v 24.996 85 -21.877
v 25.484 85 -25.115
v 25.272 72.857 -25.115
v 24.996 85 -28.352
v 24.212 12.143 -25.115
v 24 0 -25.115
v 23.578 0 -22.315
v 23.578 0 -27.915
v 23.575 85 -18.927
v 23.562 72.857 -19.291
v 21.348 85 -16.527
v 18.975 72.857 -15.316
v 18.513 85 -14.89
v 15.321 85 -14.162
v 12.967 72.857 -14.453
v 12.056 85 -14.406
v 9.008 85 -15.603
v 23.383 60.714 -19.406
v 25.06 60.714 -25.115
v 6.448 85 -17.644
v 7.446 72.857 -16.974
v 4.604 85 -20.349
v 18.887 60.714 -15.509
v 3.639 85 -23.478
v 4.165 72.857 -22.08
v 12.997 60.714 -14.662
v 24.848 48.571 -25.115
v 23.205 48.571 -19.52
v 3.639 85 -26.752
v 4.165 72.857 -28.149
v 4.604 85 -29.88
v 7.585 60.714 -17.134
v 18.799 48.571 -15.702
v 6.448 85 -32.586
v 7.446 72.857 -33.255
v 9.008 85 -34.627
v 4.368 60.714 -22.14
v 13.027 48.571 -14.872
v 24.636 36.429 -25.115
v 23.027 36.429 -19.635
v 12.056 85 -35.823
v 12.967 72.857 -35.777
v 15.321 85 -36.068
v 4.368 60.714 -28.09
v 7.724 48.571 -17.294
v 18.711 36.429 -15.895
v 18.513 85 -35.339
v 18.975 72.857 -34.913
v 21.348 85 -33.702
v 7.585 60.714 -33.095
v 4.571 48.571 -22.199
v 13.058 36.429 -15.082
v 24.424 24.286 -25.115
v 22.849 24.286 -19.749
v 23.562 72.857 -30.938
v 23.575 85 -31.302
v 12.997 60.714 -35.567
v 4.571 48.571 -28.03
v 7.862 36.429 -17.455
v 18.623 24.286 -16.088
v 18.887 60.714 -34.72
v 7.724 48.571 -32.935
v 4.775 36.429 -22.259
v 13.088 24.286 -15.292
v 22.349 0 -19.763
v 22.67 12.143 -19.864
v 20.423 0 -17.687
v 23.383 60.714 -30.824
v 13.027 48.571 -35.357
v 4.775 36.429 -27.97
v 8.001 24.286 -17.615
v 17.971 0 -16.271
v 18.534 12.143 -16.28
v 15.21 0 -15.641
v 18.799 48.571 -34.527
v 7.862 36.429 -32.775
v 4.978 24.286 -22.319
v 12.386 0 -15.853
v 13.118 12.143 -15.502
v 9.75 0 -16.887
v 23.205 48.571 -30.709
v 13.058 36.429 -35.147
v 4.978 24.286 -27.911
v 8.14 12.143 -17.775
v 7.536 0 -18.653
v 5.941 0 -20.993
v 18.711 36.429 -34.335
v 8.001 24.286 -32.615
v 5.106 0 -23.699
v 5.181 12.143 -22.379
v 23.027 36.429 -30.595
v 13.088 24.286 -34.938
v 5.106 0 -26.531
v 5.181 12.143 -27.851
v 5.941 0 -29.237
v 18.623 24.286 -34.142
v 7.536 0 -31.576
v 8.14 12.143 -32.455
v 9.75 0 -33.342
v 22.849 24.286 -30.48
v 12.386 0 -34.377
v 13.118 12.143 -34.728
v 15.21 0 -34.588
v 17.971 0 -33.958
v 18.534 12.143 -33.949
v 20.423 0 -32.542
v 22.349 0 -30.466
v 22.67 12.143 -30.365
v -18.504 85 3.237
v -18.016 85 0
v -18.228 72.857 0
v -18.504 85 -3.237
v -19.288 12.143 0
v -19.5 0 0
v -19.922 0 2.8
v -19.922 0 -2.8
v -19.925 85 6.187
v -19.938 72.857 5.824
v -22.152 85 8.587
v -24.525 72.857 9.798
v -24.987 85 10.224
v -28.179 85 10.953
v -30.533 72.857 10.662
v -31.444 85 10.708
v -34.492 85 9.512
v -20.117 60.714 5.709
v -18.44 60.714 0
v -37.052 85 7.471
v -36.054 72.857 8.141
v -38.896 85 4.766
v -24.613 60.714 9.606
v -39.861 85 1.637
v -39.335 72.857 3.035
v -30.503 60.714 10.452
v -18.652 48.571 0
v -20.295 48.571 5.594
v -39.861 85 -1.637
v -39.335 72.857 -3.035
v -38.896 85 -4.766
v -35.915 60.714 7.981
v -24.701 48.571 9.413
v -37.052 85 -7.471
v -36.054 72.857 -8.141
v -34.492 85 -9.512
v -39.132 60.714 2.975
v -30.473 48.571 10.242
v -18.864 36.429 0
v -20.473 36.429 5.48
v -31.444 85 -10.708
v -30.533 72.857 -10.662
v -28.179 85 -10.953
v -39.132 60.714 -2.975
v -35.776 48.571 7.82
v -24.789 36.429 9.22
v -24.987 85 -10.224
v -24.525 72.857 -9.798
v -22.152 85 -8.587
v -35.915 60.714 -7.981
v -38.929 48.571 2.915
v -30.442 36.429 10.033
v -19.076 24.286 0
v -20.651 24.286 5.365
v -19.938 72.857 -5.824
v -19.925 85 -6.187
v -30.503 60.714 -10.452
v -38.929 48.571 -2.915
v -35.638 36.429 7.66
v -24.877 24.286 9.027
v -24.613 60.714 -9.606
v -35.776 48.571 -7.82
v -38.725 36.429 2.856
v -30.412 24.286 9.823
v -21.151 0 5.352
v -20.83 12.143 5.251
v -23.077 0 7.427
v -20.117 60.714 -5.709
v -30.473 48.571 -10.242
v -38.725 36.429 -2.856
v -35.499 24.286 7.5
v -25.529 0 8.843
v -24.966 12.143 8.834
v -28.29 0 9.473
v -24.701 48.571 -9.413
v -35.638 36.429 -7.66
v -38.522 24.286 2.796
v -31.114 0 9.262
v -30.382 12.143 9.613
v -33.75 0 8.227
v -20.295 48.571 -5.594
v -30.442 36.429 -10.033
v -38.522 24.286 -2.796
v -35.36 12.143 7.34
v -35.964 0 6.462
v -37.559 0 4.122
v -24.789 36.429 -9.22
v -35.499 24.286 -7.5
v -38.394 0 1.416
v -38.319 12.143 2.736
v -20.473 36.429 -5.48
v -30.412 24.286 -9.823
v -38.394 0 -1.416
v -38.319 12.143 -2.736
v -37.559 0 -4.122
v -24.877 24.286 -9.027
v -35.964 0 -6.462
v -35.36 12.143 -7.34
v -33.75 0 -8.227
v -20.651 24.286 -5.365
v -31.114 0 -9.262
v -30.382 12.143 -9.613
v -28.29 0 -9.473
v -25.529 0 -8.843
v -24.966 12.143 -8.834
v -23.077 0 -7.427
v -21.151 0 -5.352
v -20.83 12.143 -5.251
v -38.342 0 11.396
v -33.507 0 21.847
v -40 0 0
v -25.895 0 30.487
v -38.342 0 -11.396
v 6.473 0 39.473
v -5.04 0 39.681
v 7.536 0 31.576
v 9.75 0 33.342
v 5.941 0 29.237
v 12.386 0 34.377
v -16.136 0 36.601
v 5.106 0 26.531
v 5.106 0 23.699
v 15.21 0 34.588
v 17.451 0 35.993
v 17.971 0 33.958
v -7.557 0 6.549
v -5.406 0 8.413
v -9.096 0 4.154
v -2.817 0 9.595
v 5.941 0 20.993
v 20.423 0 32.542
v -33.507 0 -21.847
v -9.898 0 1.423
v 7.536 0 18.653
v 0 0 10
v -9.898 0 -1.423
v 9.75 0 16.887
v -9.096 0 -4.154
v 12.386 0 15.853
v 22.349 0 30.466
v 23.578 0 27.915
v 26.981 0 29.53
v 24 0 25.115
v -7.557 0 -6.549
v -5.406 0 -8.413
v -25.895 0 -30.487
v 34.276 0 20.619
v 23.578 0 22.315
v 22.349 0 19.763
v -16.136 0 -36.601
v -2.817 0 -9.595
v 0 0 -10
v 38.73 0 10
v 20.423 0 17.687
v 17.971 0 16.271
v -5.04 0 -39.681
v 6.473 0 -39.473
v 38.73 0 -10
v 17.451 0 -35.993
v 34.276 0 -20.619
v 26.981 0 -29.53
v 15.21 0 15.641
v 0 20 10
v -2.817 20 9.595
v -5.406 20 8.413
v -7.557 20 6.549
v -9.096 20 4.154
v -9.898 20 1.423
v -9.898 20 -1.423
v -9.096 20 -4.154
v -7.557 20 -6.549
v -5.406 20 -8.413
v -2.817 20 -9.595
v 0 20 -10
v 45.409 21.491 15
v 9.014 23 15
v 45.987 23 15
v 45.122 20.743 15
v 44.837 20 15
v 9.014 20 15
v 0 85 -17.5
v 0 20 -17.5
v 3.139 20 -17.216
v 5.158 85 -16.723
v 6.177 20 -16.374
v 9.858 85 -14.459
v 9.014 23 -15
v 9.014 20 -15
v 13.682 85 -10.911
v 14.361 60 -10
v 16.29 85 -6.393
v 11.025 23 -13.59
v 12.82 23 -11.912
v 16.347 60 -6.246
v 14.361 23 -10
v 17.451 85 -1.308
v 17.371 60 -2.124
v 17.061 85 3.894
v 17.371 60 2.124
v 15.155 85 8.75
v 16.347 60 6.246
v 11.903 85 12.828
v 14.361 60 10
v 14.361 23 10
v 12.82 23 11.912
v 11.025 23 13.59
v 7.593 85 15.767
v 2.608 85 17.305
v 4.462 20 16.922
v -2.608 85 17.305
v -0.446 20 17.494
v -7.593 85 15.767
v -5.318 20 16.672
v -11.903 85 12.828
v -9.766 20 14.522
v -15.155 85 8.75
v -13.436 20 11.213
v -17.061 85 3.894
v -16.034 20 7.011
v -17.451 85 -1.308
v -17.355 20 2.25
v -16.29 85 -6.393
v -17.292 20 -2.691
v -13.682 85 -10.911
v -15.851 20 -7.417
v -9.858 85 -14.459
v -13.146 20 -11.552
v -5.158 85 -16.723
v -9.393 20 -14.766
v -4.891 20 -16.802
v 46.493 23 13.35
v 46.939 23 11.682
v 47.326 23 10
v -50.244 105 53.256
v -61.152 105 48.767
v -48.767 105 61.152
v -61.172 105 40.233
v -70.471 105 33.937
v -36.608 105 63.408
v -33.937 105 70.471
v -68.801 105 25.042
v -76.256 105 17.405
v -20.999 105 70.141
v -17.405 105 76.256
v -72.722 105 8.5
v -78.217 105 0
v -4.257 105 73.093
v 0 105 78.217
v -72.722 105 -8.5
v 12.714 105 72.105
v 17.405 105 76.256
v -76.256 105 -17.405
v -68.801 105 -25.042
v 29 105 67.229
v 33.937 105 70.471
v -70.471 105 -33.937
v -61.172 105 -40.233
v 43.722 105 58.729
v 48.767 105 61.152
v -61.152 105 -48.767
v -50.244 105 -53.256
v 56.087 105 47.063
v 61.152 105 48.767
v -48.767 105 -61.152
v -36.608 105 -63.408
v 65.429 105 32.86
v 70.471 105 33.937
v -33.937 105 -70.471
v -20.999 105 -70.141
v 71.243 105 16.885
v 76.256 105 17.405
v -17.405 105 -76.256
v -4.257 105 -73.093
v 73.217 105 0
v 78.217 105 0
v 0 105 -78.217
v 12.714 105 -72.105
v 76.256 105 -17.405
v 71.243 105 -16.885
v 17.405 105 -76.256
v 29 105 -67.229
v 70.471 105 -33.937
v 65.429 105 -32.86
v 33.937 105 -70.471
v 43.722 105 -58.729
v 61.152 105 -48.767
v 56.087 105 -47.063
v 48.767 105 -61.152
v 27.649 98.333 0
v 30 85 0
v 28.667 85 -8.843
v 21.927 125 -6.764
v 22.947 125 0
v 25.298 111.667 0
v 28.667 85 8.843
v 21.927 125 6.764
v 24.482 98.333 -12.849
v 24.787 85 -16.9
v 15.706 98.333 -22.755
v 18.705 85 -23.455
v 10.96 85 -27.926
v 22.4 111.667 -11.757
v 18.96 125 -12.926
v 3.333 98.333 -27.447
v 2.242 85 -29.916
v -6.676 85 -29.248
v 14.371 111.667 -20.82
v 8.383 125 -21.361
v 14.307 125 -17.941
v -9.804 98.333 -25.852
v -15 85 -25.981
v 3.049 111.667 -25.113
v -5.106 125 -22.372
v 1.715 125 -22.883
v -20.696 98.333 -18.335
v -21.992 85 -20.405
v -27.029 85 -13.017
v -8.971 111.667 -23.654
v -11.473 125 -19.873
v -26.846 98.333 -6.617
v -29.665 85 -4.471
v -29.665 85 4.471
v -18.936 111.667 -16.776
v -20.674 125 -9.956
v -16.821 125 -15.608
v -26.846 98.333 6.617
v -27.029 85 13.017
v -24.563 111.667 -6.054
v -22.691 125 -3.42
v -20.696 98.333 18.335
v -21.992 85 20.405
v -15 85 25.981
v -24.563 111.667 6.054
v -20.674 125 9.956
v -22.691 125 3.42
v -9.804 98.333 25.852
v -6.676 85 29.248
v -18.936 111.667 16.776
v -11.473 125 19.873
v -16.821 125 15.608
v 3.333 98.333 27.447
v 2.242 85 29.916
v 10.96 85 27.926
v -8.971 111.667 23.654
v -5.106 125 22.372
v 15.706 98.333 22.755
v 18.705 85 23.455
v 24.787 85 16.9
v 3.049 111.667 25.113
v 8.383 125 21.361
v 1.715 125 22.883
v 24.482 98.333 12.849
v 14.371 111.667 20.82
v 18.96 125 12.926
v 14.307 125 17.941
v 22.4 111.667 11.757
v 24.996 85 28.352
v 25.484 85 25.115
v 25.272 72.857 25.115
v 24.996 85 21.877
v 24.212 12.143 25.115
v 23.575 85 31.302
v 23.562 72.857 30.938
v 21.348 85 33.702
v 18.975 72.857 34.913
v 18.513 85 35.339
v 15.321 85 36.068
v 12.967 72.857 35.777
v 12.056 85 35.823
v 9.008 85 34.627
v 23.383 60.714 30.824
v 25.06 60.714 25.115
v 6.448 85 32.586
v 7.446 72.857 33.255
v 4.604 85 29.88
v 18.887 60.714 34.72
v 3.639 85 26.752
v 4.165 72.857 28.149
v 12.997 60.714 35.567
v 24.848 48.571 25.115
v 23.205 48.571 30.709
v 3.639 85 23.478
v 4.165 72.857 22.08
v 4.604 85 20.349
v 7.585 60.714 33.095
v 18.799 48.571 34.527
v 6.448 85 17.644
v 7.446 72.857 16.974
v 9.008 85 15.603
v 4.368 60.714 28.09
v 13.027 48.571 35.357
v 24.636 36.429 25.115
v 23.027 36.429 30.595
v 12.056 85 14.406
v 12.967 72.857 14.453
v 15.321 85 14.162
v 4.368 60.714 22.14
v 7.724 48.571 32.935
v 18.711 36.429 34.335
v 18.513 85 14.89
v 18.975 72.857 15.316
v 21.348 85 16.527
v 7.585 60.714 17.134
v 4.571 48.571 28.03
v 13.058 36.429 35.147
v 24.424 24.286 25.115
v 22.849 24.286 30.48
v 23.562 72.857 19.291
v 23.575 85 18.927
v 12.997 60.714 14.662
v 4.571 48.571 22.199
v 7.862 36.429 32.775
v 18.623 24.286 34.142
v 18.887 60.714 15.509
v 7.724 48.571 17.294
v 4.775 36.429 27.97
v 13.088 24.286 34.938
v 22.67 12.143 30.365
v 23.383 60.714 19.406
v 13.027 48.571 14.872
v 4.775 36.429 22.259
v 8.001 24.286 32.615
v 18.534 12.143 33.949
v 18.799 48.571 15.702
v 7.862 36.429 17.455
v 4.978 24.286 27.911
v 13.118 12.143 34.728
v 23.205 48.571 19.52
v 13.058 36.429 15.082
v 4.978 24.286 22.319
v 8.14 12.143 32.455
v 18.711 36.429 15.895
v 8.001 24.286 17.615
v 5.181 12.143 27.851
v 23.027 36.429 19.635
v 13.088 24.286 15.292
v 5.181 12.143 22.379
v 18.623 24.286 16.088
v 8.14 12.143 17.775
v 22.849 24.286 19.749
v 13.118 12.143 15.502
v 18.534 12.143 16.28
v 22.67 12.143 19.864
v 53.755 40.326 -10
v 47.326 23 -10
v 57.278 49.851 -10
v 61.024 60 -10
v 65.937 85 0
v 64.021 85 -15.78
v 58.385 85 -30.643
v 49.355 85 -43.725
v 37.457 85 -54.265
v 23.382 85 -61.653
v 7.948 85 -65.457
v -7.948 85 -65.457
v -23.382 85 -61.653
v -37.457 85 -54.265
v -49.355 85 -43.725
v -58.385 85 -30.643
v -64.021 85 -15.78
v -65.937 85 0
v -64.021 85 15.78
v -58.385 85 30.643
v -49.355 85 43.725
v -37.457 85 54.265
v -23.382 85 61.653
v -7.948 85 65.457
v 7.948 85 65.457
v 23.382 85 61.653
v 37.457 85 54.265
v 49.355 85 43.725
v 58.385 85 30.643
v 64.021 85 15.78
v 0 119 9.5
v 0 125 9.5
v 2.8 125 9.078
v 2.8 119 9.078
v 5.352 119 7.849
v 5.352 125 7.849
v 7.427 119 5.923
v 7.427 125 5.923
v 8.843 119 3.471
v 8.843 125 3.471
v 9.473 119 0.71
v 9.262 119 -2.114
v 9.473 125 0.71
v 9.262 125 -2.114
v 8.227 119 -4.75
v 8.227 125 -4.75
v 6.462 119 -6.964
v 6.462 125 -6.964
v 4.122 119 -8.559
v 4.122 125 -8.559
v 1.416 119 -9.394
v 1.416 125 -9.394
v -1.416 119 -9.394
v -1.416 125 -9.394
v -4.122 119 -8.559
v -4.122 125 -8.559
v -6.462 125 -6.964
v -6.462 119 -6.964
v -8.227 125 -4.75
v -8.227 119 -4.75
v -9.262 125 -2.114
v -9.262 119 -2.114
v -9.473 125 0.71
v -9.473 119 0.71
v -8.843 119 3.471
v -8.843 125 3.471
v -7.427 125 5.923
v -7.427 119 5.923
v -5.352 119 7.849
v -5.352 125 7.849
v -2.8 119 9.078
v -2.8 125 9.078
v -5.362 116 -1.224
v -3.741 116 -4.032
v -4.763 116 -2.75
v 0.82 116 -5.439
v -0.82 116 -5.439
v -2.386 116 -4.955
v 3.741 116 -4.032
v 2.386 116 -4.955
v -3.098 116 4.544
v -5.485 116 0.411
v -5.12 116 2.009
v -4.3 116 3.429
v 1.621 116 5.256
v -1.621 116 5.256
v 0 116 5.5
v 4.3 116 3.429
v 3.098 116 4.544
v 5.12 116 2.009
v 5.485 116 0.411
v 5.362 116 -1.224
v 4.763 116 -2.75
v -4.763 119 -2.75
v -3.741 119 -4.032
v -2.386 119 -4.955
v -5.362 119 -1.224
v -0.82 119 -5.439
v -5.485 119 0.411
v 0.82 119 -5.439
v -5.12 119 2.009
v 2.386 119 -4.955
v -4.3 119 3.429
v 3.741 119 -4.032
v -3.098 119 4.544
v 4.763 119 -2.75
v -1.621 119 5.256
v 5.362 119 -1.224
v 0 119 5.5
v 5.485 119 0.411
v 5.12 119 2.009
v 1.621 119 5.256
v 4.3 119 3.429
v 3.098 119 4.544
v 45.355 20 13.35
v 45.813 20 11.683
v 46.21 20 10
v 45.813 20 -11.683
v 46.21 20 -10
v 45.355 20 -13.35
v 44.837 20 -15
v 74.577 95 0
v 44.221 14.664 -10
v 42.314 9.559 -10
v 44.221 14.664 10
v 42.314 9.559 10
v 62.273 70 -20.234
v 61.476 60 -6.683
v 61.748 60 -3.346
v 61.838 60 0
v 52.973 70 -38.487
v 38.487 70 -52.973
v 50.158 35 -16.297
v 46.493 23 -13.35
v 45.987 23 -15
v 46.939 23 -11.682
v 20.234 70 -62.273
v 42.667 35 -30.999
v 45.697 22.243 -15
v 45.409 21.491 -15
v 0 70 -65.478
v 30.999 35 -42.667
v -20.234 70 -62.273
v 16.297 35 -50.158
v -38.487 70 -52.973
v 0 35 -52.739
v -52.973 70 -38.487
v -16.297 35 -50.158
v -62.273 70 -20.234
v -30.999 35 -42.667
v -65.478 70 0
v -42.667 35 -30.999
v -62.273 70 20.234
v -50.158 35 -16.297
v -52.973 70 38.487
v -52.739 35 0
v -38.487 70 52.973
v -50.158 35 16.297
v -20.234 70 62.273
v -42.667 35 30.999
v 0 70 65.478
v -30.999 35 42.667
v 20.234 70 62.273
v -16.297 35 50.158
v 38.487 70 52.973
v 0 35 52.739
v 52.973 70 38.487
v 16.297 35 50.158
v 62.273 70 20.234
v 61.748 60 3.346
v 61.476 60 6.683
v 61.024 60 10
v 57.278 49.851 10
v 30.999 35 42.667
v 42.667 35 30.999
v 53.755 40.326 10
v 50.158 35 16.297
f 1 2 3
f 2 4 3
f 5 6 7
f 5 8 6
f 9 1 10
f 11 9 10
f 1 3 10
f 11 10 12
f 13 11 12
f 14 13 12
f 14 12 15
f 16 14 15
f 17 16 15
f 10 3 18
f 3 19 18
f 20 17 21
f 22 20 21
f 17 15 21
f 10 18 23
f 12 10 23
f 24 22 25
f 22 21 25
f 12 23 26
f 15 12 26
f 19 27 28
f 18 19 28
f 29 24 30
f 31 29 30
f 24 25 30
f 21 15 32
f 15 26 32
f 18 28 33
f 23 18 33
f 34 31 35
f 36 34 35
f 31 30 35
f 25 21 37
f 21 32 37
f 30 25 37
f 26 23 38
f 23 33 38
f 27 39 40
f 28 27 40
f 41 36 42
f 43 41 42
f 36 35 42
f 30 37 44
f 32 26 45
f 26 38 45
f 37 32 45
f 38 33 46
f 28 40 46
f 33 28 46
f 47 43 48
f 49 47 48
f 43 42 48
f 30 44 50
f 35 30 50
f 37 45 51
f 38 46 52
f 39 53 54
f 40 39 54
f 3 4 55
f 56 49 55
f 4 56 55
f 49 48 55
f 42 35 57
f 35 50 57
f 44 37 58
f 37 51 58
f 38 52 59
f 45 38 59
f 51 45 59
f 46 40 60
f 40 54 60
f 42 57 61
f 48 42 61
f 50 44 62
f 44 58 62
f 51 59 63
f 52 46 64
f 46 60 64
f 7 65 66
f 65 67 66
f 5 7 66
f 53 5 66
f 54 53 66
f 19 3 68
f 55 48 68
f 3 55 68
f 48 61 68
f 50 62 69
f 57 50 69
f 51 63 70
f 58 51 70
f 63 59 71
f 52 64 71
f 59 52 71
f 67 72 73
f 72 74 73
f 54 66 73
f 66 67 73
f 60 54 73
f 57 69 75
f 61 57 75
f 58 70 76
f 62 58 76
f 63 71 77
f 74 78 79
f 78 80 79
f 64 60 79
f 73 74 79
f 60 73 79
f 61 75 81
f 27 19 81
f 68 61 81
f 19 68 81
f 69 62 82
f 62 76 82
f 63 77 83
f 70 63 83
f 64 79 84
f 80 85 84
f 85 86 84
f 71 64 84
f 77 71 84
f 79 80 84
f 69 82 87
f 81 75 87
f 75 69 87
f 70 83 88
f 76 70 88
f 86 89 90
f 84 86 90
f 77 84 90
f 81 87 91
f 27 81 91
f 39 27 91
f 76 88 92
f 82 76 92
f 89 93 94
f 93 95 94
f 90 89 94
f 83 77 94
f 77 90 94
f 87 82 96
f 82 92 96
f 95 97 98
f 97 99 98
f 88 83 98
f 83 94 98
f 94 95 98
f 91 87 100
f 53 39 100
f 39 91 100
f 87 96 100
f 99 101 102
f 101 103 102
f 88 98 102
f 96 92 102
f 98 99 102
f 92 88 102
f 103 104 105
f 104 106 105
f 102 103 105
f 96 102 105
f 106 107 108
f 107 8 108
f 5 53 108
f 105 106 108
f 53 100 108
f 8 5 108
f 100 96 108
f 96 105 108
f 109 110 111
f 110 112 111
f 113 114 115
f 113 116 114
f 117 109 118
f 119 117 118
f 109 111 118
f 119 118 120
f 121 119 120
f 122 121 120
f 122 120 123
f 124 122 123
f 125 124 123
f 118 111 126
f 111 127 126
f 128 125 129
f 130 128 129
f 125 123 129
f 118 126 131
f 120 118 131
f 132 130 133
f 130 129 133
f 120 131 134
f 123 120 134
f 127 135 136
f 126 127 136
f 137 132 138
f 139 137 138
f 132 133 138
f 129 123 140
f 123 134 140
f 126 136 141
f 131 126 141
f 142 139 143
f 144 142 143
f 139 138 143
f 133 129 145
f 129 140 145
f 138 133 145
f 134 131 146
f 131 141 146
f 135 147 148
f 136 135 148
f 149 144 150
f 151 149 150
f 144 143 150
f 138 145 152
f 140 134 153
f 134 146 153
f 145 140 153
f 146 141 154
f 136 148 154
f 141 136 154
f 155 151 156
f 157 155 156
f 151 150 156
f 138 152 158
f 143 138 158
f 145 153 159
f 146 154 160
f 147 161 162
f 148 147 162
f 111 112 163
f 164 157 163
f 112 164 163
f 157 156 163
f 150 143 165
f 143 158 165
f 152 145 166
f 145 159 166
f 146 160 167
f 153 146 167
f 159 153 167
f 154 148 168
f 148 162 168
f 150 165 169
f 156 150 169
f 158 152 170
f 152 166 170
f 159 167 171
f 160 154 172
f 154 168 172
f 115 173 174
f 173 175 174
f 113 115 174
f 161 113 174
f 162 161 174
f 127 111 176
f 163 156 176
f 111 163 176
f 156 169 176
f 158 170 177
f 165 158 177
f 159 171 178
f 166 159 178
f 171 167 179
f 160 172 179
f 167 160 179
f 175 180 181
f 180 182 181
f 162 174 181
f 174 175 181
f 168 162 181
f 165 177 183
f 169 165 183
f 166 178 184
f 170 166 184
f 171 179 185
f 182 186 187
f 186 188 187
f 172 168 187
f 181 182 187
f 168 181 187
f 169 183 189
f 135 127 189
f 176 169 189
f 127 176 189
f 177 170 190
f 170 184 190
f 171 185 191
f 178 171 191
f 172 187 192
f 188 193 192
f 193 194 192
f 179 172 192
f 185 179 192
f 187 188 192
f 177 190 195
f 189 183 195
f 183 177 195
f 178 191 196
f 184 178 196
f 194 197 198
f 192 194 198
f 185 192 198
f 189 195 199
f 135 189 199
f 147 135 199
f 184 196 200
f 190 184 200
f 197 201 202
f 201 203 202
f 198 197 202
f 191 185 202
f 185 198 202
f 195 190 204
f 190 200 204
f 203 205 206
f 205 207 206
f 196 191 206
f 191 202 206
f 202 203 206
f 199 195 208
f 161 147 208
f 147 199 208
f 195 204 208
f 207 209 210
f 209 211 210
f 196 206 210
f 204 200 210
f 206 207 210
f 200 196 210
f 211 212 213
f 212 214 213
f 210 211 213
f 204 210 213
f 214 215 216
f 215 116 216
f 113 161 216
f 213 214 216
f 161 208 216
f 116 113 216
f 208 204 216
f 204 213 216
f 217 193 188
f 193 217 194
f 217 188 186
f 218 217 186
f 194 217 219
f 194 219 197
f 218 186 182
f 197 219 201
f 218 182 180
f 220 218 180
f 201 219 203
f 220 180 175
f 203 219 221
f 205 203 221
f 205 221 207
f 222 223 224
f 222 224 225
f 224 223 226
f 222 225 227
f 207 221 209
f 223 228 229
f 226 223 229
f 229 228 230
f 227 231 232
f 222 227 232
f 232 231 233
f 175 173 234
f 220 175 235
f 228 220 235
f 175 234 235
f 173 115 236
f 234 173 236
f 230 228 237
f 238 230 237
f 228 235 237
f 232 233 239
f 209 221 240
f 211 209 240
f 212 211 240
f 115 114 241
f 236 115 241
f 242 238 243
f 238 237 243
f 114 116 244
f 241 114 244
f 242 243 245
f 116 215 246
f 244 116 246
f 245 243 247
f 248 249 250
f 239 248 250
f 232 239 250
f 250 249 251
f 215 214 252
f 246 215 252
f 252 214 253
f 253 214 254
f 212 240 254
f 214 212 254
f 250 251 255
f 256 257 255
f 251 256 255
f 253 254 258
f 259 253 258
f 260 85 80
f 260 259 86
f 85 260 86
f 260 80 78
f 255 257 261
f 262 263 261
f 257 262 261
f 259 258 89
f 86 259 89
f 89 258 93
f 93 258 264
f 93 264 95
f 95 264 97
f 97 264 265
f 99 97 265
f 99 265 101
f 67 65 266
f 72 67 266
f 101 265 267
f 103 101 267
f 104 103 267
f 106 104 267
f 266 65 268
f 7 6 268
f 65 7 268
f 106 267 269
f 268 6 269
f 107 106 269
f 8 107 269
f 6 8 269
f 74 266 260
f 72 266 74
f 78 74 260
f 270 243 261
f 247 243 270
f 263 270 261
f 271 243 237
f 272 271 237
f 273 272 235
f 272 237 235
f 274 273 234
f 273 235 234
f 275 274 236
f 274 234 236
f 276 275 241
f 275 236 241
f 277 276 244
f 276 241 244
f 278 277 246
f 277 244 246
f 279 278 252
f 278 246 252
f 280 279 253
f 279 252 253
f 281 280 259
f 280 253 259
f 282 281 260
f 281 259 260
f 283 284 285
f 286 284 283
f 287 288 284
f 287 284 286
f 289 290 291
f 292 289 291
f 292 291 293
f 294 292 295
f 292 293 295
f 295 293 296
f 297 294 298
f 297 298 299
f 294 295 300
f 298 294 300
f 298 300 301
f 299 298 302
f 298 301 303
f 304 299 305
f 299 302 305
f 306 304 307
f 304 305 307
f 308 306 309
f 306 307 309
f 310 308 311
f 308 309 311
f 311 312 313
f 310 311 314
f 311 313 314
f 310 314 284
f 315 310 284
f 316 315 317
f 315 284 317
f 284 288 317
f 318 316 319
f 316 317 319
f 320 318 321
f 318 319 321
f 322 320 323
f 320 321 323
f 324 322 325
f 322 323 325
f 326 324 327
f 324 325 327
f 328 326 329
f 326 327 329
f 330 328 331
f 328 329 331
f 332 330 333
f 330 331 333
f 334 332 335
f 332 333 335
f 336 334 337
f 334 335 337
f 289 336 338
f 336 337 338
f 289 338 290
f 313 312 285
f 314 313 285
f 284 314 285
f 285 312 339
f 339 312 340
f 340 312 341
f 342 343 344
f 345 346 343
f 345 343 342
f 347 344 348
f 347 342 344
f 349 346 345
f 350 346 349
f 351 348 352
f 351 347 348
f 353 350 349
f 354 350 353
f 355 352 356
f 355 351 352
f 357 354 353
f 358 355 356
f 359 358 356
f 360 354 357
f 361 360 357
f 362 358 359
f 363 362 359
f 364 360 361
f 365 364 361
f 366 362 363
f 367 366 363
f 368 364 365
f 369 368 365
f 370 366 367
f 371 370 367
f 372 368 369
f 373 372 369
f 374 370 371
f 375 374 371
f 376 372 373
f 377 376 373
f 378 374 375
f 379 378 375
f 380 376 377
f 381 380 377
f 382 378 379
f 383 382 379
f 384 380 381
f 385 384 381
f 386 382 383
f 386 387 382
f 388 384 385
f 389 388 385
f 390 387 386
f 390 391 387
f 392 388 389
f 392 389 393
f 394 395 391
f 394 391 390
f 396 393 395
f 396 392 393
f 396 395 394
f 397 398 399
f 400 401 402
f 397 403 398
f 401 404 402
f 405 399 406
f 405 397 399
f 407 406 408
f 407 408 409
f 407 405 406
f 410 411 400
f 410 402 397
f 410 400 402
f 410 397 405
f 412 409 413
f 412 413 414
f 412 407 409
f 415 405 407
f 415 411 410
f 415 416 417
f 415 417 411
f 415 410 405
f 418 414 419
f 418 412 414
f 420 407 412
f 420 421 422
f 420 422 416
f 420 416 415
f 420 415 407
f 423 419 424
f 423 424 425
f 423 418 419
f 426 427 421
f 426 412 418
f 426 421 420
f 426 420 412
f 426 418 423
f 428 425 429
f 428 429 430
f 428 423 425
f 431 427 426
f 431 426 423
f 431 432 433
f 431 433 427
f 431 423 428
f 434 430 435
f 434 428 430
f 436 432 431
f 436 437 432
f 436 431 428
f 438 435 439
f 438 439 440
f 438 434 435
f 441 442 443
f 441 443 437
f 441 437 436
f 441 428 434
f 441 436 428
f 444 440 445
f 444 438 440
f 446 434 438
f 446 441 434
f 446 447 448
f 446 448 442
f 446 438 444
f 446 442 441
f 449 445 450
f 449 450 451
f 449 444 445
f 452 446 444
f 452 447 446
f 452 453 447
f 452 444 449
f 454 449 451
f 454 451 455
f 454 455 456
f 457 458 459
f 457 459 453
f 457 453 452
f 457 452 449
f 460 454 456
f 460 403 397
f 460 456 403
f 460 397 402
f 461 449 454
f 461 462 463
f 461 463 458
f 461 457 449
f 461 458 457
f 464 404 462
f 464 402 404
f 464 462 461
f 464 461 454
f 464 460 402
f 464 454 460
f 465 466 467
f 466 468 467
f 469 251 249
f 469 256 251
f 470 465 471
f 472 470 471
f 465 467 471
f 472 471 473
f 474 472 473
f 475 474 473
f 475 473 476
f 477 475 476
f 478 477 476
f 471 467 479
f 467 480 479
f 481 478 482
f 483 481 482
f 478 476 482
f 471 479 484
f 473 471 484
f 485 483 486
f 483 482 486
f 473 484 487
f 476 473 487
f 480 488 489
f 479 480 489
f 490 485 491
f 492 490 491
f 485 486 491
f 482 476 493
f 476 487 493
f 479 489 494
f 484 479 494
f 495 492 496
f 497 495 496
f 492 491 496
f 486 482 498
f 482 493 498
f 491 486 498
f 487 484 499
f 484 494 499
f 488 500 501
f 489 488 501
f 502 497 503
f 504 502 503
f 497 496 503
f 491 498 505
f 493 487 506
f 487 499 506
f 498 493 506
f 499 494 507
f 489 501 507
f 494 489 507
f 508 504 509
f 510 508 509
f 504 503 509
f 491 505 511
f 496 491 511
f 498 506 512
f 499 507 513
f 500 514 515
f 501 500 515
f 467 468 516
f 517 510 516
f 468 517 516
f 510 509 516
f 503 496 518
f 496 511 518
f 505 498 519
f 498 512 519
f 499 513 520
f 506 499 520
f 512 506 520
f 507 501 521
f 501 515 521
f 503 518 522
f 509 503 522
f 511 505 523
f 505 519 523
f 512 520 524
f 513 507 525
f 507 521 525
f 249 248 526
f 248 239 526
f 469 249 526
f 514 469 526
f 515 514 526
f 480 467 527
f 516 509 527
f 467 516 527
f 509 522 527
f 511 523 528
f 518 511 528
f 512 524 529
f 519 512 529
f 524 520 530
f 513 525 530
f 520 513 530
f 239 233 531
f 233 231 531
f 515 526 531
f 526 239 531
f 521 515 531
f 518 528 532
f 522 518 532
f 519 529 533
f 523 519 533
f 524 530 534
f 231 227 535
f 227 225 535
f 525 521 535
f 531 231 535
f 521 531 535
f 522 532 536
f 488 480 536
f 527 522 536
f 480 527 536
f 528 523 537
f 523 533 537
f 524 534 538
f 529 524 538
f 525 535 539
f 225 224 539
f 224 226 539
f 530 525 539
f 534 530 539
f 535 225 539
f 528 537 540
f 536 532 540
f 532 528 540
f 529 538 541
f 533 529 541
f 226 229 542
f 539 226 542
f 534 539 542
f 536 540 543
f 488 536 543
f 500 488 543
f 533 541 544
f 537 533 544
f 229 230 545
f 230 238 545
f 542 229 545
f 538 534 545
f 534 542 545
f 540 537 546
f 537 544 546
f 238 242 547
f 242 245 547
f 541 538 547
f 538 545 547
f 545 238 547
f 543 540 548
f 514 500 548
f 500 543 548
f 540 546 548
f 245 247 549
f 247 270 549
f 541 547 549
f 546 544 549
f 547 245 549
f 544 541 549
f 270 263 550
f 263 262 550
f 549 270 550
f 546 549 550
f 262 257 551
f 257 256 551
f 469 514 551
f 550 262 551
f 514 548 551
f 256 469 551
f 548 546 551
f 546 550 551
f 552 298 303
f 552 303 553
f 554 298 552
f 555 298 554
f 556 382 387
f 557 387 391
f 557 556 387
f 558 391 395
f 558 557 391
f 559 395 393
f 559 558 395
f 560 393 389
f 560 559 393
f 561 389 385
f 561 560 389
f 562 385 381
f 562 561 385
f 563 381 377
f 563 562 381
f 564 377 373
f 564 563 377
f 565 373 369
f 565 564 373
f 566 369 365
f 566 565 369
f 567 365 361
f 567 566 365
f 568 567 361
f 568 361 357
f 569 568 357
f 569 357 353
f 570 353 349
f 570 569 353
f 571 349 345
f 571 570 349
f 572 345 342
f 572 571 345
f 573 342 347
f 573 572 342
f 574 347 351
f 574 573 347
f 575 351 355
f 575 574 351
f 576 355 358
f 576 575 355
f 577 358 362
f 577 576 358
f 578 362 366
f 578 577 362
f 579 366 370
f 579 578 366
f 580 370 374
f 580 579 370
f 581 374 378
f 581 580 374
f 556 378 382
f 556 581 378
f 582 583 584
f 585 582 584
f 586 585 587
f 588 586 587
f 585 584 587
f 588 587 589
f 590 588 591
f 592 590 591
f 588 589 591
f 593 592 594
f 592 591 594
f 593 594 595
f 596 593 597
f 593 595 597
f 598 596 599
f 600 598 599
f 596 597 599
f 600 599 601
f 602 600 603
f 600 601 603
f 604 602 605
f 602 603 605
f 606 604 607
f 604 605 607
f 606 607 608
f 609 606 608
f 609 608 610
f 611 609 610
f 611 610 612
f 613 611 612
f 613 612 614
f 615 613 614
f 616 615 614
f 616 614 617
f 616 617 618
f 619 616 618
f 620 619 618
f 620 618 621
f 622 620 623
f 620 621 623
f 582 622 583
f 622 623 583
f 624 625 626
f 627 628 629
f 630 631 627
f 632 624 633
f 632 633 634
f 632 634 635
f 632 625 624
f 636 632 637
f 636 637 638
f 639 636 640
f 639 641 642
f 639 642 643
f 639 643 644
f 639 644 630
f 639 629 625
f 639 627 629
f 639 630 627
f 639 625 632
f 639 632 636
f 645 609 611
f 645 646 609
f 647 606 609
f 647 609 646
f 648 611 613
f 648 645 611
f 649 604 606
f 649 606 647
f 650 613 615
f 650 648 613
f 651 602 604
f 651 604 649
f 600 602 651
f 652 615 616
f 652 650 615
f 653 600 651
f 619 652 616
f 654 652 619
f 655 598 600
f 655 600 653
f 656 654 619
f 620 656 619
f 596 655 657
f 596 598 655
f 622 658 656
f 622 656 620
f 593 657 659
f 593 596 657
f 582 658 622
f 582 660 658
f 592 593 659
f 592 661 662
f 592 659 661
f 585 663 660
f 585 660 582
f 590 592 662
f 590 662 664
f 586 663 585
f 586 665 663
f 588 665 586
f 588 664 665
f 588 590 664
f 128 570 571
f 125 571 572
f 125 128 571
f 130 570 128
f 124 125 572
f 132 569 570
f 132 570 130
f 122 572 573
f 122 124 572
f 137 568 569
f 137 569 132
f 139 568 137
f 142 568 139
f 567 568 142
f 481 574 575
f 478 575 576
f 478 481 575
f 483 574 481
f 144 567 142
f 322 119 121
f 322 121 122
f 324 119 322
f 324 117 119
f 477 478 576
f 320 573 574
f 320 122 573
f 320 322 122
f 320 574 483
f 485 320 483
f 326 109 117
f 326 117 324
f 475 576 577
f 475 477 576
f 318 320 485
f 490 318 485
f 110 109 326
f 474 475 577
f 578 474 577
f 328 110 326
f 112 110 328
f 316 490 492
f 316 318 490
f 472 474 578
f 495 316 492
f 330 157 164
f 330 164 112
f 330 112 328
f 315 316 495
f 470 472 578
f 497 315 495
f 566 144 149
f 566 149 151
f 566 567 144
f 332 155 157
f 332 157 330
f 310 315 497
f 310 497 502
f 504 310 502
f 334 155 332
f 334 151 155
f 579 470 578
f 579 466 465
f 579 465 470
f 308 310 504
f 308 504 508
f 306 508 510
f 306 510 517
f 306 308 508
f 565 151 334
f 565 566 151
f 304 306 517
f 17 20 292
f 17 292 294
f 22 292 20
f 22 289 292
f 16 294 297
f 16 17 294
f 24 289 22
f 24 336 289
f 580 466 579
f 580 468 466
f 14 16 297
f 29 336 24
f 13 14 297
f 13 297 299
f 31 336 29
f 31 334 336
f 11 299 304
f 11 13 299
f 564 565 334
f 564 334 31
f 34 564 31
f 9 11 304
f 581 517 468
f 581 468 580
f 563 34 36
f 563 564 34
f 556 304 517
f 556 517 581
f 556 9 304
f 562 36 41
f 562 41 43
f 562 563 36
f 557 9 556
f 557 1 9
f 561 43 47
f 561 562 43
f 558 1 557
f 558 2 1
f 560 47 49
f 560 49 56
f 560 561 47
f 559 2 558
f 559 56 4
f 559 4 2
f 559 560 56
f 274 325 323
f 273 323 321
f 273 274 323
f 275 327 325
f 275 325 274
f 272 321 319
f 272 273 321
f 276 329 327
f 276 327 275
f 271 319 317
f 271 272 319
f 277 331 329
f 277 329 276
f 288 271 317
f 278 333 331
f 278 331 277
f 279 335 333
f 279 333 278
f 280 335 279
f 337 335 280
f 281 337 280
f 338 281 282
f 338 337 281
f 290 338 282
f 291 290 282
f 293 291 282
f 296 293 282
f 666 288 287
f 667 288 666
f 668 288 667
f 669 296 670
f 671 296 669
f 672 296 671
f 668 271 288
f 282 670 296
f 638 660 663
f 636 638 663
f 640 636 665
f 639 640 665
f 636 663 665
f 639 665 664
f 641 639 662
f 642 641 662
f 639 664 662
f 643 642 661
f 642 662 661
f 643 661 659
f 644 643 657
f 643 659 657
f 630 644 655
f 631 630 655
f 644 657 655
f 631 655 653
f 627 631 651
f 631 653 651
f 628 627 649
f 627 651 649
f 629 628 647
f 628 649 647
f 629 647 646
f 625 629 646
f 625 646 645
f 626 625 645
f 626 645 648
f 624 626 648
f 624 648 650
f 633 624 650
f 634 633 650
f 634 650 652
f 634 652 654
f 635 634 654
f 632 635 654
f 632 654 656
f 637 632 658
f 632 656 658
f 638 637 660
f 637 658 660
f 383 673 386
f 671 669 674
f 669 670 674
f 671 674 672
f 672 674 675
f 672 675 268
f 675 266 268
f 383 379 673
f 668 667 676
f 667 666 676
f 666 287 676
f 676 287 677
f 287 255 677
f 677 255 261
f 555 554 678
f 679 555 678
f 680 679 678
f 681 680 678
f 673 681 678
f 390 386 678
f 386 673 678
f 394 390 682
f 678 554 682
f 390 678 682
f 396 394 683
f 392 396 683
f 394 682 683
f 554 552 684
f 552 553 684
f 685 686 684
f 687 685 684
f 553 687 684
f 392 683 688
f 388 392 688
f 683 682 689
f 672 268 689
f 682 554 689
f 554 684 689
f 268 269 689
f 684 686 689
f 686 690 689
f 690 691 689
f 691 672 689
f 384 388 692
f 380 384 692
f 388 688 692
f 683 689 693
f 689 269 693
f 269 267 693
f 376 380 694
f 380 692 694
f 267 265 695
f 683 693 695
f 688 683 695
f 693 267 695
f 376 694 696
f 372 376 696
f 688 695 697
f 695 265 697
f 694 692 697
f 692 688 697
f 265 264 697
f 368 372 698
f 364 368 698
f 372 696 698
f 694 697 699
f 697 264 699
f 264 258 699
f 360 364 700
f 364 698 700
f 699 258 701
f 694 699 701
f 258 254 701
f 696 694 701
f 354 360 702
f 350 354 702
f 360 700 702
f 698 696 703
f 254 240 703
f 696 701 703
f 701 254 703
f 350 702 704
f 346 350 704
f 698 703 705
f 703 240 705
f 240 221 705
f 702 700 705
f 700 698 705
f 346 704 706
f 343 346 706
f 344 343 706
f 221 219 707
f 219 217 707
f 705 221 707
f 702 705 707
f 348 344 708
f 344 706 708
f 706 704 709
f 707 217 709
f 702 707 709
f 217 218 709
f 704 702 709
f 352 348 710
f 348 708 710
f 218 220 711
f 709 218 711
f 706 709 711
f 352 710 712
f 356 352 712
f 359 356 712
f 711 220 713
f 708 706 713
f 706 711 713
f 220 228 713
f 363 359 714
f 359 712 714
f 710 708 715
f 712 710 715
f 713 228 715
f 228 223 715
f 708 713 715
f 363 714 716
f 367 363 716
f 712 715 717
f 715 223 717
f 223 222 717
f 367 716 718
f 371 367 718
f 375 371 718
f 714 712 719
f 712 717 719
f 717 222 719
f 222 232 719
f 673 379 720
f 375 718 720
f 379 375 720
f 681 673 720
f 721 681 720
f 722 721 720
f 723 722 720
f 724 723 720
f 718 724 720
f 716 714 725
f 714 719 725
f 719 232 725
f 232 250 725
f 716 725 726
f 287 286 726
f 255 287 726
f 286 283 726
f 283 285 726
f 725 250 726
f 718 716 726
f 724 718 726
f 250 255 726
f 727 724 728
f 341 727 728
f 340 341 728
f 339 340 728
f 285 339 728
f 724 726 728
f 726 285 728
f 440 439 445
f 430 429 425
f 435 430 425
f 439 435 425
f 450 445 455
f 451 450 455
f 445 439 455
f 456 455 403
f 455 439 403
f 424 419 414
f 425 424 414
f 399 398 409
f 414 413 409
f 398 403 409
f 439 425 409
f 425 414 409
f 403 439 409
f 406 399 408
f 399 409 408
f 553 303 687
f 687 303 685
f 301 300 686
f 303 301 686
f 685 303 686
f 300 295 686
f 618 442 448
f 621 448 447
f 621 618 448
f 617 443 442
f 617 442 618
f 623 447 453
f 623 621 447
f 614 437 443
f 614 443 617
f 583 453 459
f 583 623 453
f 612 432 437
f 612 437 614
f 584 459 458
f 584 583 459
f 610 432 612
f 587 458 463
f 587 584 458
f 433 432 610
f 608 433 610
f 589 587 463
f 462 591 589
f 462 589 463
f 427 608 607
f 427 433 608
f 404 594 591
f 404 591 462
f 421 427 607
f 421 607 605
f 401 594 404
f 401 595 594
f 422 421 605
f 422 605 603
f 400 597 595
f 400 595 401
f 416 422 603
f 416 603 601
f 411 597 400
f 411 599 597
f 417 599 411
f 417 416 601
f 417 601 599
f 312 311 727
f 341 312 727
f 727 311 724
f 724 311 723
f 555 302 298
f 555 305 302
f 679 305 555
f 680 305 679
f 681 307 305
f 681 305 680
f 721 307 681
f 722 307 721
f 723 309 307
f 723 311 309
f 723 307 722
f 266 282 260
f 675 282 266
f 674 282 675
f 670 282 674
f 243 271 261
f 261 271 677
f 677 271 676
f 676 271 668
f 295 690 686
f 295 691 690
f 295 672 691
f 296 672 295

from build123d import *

# Parameters (mm, degrees)
SKETCH1_R                    = 40
BOSS_EXTRUDE1_DEPTH          = 105
BOSS_EXTRUDE1_DRAFT          = -20
SKETCH2_R                    = 10
CUT_EXTRUDE1_DEPTH           = 20
SKETCH3_W                    = 90.152785451
SKETCH3_H                    = 60
CUT_EXTRUDE2_DEPTH           = 10
SKETCH4_R                    = 9.5
CUT_EXTRUDE3_DEPTH           = 105
CUT_EXTRUDE3_DRAFT           = 1
CUT_EXTRUDE3_PROFILE_2_DEPTH = 105
CUT_EXTRUDE3_PROFILE_2_DRAFT = 1
CUT_EXTRUDE3_PROFILE_3_DEPTH = 105
CUT_EXTRUDE3_PROFILE_3_DRAFT = 1
SKETCH7_R                    = 17.5
CUT_EXTRUDE5_DEPTH           = 80
CUT_EXTRUDE6_DEPTH           = 3
SKETCH9_R                    = 73.216874598
CUT_EXTRUDE7_DEPTH           = 20
CUT_EXTRUDE7_TAPER           = 20
CUT_EXTRUDE7_OTHER_WAY_DEPTH = 20
CUT_EXTRUDE7_OTHER_WAY_TAPER = 20
SKETCH10_R                   = 30
BOSS_EXTRUDE2_DEPTH          = 40
BOSS_EXTRUDE2_TAPER          = 10
SKETCH11_R                   = 9.5
CUT_EXTRUDE8_DEPTH           = 6
SKETCH12_R                   = 5.5
CUT_EXTRUDE9_DEPTH           = 3


with BuildPart() as part:
    # Sketch1 → Boss-Extrude1 (with draft: the straight prism first)
    with BuildSketch(Plane(origin=(0, 0, 0), x_dir=(1, 0, 0), z_dir=(0, 1, 0))):
        Circle(SKETCH1_R)
    extrude(amount=BOSS_EXTRUDE1_DEPTH)
    # Boss-Extrude1: the draft: its side faces are tilted about the plane it starts from
    boss_extrude1_sides = [part.faces().sort_by_distance(p)[0] for p in [
        (-40, 52.5, 0),
    ]]
    draft(boss_extrude1_sides, Plane(origin=(0, 0, 0), x_dir=(1, 0, 0), z_dir=(0, 1, 0)), BOSS_EXTRUDE1_DRAFT)

    # Sketch2 → Cut-Extrude1 (cut)
    with BuildSketch(Plane.XZ):
        with Locations(Location((0, 0, 0), (0, 0, 270))):
            Circle(SKETCH2_R)
    extrude(amount=-CUT_EXTRUDE1_DEPTH, mode=Mode.SUBTRACT)

    # Sketch3 → Cut-Extrude2 (cut, symmetric)
    with BuildSketch(Plane.XY):
        with Locations((45.076392725, 30)):
            Rectangle(SKETCH3_W, SKETCH3_H)
    extrude(amount=CUT_EXTRUDE2_DEPTH, both=True, mode=Mode.SUBTRACT)


with BuildPart() as cut_extrude3_tool:
    # Sketch4 → Cut-Extrude3 (with draft: the straight prism first)
    with BuildSketch(Plane.XZ):
        with Locations((14.5, 25.11473671)):
            Circle(SKETCH4_R)
    extrude(amount=-CUT_EXTRUDE3_DEPTH)
    # Cut-Extrude3: the draft: its side faces are tilted about the plane it starts from
    cut_extrude3_sides = [cut_extrude3_tool.faces().sort_by_distance(p)[0] for p in [
        (5, 52.5, 25.11473671),
    ]]
    draft(cut_extrude3_sides, Plane.XZ, CUT_EXTRUDE3_DRAFT)


with BuildPart() as part_1:
    add(part.part)

    # Cut-Extrude3: cut by cut_extrude3_tool
    add(cut_extrude3_tool.part, mode=Mode.SUBTRACT)


with BuildPart() as cut_extrude3_profile_2_tool:
    # Sketch4 → Cut-Extrude3 profile 2 (with draft: the straight prism first)
    with BuildSketch(Plane.XZ):
        with Locations((-29, 0)):
            Circle(SKETCH4_R)
    extrude(amount=-CUT_EXTRUDE3_PROFILE_2_DEPTH)
    # Cut-Extrude3 profile 2: the draft: its side faces are tilted about the plane it starts from
    cut_extrude3_profile_2_sides = [cut_extrude3_profile_2_tool.faces().sort_by_distance(p)[0] for p in [
        (-38.5, 52.5, 0),
    ]]
    draft(cut_extrude3_profile_2_sides, Plane.XZ, CUT_EXTRUDE3_PROFILE_2_DRAFT)


with BuildPart() as part_2:
    add(part_1.part)

    # Cut-Extrude3 profile 2: cut by cut_extrude3_profile_2_tool
    add(cut_extrude3_profile_2_tool.part, mode=Mode.SUBTRACT)


with BuildPart() as cut_extrude3_profile_3_tool:
    # Sketch4 → Cut-Extrude3 profile 3 (with draft: the straight prism first)
    with BuildSketch(Plane.XZ):
        with Locations((14.5, -25.11473671)):
            Circle(SKETCH4_R)
    extrude(amount=-CUT_EXTRUDE3_PROFILE_3_DEPTH)
    # Cut-Extrude3 profile 3: the draft: its side faces are tilted about the plane it starts from
    cut_extrude3_profile_3_sides = [cut_extrude3_profile_3_tool.faces().sort_by_distance(p)[0] for p in [
        (5, 52.5, -25.11473671),
    ]]
    draft(cut_extrude3_profile_3_sides, Plane.XZ, CUT_EXTRUDE3_PROFILE_3_DRAFT)


with BuildPart() as part_3:
    add(part_2.part)

    # Cut-Extrude3 profile 3: cut by cut_extrude3_profile_3_tool
    add(cut_extrude3_profile_3_tool.part, mode=Mode.SUBTRACT)

    # Sketch7 → Cut-Extrude5 (cut)
    with BuildSketch(Plane.XZ.offset(-20)):
        with Locations(Location((0, 0, 0), (0, 0, 270))):
            Circle(SKETCH7_R)
    extrude(amount=-CUT_EXTRUDE5_DEPTH, mode=Mode.SUBTRACT)

    # Sketch8 → Cut-Extrude6 (cut)
    with BuildSketch(Plane(origin=(0, 20, 0), x_dir=(1, 0, 0), z_dir=(0, 1, 0))):
        with BuildLine():
            ThreePointArc((14.361406616, -10), (11.952028486, -12.782762419), (9.013878189, -15))
            Line((9.013878189, -15), (73.540166037, -15))
            Line((73.540166037, -15), (73.540166037, 15))
            Line((73.540166037, 15), (9.013878189, 15))
            ThreePointArc((9.013878189, 15), (11.952028486, 12.782762419), (14.361406616, 10))
            Line((14.361406616, 10), (0, 10))
            Line((0, 10), (0, -10))
            Line((0, -10), (14.361406616, -10))
        make_face()
        with BuildLine():
            ThreePointArc((14.361406616, 10), (11.952028486, 12.782762419), (9.013878189, 15))
            Line((9.013878189, 15), (0, 15))
            Line((0, 15), (0, 10))
            Line((0, 10), (14.361406616, 10))
        make_face()
        with BuildLine():
            Line((0, -10), (0, -15))
            Line((0, -15), (9.013878189, -15))
            ThreePointArc((9.013878189, -15), (11.952028486, -12.782762419), (14.361406616, -10))
            Line((14.361406616, -10), (0, -10))
        make_face()
    extrude(amount=CUT_EXTRUDE6_DEPTH, mode=Mode.SUBTRACT)

    # Sketch9 → Cut-Extrude7 (cut)
    with BuildSketch(Plane(origin=(0, 105, 0), x_dir=(1, 0, 0), z_dir=(0, 1, 0))):
        Circle(SKETCH9_R)
    extrude(amount=CUT_EXTRUDE7_DEPTH, taper=CUT_EXTRUDE7_TAPER, mode=Mode.SUBTRACT)

    # Sketch9 → Cut-Extrude7 other way (cut)
    with BuildSketch(Plane(origin=(0, 105, 0), x_dir=(1, 0, 0), z_dir=(0, 1, 0))):
        Circle(SKETCH9_R)
    extrude(amount=-CUT_EXTRUDE7_OTHER_WAY_DEPTH, taper=CUT_EXTRUDE7_OTHER_WAY_TAPER, mode=Mode.SUBTRACT)


with BuildPart() as body_2:
    # Sketch10 → Boss-Extrude2 (new body)
    with BuildSketch(Plane(origin=(0, 85, 0), x_dir=(1, 0, 0), z_dir=(0, 1, 0))):
        Circle(SKETCH10_R)
    extrude(amount=BOSS_EXTRUDE2_DEPTH, taper=BOSS_EXTRUDE2_TAPER)

    # Sketch11 → Cut-Extrude8 (cut)
    with BuildSketch(Plane(origin=(0, 125, 0), x_dir=(1, 0, 0), z_dir=(0, 1, 0))):
        with Locations(Location((0, 0, 0), (0, 0, 270))):
            Circle(SKETCH11_R)
    extrude(amount=-CUT_EXTRUDE8_DEPTH, mode=Mode.SUBTRACT)

    # Sketch12 → Cut-Extrude9 (cut)
    with BuildSketch(Plane(origin=(0, 119, 0), x_dir=(1, 0, 0), z_dir=(0, 1, 0))):
        with Locations(Location((0, 0, 0), (0, 0, 270))):
            Circle(SKETCH12_R)
    extrude(amount=-CUT_EXTRUDE9_DEPTH, mode=Mode.SUBTRACT)


solid = Compound([part_3.part, body_2.part])
